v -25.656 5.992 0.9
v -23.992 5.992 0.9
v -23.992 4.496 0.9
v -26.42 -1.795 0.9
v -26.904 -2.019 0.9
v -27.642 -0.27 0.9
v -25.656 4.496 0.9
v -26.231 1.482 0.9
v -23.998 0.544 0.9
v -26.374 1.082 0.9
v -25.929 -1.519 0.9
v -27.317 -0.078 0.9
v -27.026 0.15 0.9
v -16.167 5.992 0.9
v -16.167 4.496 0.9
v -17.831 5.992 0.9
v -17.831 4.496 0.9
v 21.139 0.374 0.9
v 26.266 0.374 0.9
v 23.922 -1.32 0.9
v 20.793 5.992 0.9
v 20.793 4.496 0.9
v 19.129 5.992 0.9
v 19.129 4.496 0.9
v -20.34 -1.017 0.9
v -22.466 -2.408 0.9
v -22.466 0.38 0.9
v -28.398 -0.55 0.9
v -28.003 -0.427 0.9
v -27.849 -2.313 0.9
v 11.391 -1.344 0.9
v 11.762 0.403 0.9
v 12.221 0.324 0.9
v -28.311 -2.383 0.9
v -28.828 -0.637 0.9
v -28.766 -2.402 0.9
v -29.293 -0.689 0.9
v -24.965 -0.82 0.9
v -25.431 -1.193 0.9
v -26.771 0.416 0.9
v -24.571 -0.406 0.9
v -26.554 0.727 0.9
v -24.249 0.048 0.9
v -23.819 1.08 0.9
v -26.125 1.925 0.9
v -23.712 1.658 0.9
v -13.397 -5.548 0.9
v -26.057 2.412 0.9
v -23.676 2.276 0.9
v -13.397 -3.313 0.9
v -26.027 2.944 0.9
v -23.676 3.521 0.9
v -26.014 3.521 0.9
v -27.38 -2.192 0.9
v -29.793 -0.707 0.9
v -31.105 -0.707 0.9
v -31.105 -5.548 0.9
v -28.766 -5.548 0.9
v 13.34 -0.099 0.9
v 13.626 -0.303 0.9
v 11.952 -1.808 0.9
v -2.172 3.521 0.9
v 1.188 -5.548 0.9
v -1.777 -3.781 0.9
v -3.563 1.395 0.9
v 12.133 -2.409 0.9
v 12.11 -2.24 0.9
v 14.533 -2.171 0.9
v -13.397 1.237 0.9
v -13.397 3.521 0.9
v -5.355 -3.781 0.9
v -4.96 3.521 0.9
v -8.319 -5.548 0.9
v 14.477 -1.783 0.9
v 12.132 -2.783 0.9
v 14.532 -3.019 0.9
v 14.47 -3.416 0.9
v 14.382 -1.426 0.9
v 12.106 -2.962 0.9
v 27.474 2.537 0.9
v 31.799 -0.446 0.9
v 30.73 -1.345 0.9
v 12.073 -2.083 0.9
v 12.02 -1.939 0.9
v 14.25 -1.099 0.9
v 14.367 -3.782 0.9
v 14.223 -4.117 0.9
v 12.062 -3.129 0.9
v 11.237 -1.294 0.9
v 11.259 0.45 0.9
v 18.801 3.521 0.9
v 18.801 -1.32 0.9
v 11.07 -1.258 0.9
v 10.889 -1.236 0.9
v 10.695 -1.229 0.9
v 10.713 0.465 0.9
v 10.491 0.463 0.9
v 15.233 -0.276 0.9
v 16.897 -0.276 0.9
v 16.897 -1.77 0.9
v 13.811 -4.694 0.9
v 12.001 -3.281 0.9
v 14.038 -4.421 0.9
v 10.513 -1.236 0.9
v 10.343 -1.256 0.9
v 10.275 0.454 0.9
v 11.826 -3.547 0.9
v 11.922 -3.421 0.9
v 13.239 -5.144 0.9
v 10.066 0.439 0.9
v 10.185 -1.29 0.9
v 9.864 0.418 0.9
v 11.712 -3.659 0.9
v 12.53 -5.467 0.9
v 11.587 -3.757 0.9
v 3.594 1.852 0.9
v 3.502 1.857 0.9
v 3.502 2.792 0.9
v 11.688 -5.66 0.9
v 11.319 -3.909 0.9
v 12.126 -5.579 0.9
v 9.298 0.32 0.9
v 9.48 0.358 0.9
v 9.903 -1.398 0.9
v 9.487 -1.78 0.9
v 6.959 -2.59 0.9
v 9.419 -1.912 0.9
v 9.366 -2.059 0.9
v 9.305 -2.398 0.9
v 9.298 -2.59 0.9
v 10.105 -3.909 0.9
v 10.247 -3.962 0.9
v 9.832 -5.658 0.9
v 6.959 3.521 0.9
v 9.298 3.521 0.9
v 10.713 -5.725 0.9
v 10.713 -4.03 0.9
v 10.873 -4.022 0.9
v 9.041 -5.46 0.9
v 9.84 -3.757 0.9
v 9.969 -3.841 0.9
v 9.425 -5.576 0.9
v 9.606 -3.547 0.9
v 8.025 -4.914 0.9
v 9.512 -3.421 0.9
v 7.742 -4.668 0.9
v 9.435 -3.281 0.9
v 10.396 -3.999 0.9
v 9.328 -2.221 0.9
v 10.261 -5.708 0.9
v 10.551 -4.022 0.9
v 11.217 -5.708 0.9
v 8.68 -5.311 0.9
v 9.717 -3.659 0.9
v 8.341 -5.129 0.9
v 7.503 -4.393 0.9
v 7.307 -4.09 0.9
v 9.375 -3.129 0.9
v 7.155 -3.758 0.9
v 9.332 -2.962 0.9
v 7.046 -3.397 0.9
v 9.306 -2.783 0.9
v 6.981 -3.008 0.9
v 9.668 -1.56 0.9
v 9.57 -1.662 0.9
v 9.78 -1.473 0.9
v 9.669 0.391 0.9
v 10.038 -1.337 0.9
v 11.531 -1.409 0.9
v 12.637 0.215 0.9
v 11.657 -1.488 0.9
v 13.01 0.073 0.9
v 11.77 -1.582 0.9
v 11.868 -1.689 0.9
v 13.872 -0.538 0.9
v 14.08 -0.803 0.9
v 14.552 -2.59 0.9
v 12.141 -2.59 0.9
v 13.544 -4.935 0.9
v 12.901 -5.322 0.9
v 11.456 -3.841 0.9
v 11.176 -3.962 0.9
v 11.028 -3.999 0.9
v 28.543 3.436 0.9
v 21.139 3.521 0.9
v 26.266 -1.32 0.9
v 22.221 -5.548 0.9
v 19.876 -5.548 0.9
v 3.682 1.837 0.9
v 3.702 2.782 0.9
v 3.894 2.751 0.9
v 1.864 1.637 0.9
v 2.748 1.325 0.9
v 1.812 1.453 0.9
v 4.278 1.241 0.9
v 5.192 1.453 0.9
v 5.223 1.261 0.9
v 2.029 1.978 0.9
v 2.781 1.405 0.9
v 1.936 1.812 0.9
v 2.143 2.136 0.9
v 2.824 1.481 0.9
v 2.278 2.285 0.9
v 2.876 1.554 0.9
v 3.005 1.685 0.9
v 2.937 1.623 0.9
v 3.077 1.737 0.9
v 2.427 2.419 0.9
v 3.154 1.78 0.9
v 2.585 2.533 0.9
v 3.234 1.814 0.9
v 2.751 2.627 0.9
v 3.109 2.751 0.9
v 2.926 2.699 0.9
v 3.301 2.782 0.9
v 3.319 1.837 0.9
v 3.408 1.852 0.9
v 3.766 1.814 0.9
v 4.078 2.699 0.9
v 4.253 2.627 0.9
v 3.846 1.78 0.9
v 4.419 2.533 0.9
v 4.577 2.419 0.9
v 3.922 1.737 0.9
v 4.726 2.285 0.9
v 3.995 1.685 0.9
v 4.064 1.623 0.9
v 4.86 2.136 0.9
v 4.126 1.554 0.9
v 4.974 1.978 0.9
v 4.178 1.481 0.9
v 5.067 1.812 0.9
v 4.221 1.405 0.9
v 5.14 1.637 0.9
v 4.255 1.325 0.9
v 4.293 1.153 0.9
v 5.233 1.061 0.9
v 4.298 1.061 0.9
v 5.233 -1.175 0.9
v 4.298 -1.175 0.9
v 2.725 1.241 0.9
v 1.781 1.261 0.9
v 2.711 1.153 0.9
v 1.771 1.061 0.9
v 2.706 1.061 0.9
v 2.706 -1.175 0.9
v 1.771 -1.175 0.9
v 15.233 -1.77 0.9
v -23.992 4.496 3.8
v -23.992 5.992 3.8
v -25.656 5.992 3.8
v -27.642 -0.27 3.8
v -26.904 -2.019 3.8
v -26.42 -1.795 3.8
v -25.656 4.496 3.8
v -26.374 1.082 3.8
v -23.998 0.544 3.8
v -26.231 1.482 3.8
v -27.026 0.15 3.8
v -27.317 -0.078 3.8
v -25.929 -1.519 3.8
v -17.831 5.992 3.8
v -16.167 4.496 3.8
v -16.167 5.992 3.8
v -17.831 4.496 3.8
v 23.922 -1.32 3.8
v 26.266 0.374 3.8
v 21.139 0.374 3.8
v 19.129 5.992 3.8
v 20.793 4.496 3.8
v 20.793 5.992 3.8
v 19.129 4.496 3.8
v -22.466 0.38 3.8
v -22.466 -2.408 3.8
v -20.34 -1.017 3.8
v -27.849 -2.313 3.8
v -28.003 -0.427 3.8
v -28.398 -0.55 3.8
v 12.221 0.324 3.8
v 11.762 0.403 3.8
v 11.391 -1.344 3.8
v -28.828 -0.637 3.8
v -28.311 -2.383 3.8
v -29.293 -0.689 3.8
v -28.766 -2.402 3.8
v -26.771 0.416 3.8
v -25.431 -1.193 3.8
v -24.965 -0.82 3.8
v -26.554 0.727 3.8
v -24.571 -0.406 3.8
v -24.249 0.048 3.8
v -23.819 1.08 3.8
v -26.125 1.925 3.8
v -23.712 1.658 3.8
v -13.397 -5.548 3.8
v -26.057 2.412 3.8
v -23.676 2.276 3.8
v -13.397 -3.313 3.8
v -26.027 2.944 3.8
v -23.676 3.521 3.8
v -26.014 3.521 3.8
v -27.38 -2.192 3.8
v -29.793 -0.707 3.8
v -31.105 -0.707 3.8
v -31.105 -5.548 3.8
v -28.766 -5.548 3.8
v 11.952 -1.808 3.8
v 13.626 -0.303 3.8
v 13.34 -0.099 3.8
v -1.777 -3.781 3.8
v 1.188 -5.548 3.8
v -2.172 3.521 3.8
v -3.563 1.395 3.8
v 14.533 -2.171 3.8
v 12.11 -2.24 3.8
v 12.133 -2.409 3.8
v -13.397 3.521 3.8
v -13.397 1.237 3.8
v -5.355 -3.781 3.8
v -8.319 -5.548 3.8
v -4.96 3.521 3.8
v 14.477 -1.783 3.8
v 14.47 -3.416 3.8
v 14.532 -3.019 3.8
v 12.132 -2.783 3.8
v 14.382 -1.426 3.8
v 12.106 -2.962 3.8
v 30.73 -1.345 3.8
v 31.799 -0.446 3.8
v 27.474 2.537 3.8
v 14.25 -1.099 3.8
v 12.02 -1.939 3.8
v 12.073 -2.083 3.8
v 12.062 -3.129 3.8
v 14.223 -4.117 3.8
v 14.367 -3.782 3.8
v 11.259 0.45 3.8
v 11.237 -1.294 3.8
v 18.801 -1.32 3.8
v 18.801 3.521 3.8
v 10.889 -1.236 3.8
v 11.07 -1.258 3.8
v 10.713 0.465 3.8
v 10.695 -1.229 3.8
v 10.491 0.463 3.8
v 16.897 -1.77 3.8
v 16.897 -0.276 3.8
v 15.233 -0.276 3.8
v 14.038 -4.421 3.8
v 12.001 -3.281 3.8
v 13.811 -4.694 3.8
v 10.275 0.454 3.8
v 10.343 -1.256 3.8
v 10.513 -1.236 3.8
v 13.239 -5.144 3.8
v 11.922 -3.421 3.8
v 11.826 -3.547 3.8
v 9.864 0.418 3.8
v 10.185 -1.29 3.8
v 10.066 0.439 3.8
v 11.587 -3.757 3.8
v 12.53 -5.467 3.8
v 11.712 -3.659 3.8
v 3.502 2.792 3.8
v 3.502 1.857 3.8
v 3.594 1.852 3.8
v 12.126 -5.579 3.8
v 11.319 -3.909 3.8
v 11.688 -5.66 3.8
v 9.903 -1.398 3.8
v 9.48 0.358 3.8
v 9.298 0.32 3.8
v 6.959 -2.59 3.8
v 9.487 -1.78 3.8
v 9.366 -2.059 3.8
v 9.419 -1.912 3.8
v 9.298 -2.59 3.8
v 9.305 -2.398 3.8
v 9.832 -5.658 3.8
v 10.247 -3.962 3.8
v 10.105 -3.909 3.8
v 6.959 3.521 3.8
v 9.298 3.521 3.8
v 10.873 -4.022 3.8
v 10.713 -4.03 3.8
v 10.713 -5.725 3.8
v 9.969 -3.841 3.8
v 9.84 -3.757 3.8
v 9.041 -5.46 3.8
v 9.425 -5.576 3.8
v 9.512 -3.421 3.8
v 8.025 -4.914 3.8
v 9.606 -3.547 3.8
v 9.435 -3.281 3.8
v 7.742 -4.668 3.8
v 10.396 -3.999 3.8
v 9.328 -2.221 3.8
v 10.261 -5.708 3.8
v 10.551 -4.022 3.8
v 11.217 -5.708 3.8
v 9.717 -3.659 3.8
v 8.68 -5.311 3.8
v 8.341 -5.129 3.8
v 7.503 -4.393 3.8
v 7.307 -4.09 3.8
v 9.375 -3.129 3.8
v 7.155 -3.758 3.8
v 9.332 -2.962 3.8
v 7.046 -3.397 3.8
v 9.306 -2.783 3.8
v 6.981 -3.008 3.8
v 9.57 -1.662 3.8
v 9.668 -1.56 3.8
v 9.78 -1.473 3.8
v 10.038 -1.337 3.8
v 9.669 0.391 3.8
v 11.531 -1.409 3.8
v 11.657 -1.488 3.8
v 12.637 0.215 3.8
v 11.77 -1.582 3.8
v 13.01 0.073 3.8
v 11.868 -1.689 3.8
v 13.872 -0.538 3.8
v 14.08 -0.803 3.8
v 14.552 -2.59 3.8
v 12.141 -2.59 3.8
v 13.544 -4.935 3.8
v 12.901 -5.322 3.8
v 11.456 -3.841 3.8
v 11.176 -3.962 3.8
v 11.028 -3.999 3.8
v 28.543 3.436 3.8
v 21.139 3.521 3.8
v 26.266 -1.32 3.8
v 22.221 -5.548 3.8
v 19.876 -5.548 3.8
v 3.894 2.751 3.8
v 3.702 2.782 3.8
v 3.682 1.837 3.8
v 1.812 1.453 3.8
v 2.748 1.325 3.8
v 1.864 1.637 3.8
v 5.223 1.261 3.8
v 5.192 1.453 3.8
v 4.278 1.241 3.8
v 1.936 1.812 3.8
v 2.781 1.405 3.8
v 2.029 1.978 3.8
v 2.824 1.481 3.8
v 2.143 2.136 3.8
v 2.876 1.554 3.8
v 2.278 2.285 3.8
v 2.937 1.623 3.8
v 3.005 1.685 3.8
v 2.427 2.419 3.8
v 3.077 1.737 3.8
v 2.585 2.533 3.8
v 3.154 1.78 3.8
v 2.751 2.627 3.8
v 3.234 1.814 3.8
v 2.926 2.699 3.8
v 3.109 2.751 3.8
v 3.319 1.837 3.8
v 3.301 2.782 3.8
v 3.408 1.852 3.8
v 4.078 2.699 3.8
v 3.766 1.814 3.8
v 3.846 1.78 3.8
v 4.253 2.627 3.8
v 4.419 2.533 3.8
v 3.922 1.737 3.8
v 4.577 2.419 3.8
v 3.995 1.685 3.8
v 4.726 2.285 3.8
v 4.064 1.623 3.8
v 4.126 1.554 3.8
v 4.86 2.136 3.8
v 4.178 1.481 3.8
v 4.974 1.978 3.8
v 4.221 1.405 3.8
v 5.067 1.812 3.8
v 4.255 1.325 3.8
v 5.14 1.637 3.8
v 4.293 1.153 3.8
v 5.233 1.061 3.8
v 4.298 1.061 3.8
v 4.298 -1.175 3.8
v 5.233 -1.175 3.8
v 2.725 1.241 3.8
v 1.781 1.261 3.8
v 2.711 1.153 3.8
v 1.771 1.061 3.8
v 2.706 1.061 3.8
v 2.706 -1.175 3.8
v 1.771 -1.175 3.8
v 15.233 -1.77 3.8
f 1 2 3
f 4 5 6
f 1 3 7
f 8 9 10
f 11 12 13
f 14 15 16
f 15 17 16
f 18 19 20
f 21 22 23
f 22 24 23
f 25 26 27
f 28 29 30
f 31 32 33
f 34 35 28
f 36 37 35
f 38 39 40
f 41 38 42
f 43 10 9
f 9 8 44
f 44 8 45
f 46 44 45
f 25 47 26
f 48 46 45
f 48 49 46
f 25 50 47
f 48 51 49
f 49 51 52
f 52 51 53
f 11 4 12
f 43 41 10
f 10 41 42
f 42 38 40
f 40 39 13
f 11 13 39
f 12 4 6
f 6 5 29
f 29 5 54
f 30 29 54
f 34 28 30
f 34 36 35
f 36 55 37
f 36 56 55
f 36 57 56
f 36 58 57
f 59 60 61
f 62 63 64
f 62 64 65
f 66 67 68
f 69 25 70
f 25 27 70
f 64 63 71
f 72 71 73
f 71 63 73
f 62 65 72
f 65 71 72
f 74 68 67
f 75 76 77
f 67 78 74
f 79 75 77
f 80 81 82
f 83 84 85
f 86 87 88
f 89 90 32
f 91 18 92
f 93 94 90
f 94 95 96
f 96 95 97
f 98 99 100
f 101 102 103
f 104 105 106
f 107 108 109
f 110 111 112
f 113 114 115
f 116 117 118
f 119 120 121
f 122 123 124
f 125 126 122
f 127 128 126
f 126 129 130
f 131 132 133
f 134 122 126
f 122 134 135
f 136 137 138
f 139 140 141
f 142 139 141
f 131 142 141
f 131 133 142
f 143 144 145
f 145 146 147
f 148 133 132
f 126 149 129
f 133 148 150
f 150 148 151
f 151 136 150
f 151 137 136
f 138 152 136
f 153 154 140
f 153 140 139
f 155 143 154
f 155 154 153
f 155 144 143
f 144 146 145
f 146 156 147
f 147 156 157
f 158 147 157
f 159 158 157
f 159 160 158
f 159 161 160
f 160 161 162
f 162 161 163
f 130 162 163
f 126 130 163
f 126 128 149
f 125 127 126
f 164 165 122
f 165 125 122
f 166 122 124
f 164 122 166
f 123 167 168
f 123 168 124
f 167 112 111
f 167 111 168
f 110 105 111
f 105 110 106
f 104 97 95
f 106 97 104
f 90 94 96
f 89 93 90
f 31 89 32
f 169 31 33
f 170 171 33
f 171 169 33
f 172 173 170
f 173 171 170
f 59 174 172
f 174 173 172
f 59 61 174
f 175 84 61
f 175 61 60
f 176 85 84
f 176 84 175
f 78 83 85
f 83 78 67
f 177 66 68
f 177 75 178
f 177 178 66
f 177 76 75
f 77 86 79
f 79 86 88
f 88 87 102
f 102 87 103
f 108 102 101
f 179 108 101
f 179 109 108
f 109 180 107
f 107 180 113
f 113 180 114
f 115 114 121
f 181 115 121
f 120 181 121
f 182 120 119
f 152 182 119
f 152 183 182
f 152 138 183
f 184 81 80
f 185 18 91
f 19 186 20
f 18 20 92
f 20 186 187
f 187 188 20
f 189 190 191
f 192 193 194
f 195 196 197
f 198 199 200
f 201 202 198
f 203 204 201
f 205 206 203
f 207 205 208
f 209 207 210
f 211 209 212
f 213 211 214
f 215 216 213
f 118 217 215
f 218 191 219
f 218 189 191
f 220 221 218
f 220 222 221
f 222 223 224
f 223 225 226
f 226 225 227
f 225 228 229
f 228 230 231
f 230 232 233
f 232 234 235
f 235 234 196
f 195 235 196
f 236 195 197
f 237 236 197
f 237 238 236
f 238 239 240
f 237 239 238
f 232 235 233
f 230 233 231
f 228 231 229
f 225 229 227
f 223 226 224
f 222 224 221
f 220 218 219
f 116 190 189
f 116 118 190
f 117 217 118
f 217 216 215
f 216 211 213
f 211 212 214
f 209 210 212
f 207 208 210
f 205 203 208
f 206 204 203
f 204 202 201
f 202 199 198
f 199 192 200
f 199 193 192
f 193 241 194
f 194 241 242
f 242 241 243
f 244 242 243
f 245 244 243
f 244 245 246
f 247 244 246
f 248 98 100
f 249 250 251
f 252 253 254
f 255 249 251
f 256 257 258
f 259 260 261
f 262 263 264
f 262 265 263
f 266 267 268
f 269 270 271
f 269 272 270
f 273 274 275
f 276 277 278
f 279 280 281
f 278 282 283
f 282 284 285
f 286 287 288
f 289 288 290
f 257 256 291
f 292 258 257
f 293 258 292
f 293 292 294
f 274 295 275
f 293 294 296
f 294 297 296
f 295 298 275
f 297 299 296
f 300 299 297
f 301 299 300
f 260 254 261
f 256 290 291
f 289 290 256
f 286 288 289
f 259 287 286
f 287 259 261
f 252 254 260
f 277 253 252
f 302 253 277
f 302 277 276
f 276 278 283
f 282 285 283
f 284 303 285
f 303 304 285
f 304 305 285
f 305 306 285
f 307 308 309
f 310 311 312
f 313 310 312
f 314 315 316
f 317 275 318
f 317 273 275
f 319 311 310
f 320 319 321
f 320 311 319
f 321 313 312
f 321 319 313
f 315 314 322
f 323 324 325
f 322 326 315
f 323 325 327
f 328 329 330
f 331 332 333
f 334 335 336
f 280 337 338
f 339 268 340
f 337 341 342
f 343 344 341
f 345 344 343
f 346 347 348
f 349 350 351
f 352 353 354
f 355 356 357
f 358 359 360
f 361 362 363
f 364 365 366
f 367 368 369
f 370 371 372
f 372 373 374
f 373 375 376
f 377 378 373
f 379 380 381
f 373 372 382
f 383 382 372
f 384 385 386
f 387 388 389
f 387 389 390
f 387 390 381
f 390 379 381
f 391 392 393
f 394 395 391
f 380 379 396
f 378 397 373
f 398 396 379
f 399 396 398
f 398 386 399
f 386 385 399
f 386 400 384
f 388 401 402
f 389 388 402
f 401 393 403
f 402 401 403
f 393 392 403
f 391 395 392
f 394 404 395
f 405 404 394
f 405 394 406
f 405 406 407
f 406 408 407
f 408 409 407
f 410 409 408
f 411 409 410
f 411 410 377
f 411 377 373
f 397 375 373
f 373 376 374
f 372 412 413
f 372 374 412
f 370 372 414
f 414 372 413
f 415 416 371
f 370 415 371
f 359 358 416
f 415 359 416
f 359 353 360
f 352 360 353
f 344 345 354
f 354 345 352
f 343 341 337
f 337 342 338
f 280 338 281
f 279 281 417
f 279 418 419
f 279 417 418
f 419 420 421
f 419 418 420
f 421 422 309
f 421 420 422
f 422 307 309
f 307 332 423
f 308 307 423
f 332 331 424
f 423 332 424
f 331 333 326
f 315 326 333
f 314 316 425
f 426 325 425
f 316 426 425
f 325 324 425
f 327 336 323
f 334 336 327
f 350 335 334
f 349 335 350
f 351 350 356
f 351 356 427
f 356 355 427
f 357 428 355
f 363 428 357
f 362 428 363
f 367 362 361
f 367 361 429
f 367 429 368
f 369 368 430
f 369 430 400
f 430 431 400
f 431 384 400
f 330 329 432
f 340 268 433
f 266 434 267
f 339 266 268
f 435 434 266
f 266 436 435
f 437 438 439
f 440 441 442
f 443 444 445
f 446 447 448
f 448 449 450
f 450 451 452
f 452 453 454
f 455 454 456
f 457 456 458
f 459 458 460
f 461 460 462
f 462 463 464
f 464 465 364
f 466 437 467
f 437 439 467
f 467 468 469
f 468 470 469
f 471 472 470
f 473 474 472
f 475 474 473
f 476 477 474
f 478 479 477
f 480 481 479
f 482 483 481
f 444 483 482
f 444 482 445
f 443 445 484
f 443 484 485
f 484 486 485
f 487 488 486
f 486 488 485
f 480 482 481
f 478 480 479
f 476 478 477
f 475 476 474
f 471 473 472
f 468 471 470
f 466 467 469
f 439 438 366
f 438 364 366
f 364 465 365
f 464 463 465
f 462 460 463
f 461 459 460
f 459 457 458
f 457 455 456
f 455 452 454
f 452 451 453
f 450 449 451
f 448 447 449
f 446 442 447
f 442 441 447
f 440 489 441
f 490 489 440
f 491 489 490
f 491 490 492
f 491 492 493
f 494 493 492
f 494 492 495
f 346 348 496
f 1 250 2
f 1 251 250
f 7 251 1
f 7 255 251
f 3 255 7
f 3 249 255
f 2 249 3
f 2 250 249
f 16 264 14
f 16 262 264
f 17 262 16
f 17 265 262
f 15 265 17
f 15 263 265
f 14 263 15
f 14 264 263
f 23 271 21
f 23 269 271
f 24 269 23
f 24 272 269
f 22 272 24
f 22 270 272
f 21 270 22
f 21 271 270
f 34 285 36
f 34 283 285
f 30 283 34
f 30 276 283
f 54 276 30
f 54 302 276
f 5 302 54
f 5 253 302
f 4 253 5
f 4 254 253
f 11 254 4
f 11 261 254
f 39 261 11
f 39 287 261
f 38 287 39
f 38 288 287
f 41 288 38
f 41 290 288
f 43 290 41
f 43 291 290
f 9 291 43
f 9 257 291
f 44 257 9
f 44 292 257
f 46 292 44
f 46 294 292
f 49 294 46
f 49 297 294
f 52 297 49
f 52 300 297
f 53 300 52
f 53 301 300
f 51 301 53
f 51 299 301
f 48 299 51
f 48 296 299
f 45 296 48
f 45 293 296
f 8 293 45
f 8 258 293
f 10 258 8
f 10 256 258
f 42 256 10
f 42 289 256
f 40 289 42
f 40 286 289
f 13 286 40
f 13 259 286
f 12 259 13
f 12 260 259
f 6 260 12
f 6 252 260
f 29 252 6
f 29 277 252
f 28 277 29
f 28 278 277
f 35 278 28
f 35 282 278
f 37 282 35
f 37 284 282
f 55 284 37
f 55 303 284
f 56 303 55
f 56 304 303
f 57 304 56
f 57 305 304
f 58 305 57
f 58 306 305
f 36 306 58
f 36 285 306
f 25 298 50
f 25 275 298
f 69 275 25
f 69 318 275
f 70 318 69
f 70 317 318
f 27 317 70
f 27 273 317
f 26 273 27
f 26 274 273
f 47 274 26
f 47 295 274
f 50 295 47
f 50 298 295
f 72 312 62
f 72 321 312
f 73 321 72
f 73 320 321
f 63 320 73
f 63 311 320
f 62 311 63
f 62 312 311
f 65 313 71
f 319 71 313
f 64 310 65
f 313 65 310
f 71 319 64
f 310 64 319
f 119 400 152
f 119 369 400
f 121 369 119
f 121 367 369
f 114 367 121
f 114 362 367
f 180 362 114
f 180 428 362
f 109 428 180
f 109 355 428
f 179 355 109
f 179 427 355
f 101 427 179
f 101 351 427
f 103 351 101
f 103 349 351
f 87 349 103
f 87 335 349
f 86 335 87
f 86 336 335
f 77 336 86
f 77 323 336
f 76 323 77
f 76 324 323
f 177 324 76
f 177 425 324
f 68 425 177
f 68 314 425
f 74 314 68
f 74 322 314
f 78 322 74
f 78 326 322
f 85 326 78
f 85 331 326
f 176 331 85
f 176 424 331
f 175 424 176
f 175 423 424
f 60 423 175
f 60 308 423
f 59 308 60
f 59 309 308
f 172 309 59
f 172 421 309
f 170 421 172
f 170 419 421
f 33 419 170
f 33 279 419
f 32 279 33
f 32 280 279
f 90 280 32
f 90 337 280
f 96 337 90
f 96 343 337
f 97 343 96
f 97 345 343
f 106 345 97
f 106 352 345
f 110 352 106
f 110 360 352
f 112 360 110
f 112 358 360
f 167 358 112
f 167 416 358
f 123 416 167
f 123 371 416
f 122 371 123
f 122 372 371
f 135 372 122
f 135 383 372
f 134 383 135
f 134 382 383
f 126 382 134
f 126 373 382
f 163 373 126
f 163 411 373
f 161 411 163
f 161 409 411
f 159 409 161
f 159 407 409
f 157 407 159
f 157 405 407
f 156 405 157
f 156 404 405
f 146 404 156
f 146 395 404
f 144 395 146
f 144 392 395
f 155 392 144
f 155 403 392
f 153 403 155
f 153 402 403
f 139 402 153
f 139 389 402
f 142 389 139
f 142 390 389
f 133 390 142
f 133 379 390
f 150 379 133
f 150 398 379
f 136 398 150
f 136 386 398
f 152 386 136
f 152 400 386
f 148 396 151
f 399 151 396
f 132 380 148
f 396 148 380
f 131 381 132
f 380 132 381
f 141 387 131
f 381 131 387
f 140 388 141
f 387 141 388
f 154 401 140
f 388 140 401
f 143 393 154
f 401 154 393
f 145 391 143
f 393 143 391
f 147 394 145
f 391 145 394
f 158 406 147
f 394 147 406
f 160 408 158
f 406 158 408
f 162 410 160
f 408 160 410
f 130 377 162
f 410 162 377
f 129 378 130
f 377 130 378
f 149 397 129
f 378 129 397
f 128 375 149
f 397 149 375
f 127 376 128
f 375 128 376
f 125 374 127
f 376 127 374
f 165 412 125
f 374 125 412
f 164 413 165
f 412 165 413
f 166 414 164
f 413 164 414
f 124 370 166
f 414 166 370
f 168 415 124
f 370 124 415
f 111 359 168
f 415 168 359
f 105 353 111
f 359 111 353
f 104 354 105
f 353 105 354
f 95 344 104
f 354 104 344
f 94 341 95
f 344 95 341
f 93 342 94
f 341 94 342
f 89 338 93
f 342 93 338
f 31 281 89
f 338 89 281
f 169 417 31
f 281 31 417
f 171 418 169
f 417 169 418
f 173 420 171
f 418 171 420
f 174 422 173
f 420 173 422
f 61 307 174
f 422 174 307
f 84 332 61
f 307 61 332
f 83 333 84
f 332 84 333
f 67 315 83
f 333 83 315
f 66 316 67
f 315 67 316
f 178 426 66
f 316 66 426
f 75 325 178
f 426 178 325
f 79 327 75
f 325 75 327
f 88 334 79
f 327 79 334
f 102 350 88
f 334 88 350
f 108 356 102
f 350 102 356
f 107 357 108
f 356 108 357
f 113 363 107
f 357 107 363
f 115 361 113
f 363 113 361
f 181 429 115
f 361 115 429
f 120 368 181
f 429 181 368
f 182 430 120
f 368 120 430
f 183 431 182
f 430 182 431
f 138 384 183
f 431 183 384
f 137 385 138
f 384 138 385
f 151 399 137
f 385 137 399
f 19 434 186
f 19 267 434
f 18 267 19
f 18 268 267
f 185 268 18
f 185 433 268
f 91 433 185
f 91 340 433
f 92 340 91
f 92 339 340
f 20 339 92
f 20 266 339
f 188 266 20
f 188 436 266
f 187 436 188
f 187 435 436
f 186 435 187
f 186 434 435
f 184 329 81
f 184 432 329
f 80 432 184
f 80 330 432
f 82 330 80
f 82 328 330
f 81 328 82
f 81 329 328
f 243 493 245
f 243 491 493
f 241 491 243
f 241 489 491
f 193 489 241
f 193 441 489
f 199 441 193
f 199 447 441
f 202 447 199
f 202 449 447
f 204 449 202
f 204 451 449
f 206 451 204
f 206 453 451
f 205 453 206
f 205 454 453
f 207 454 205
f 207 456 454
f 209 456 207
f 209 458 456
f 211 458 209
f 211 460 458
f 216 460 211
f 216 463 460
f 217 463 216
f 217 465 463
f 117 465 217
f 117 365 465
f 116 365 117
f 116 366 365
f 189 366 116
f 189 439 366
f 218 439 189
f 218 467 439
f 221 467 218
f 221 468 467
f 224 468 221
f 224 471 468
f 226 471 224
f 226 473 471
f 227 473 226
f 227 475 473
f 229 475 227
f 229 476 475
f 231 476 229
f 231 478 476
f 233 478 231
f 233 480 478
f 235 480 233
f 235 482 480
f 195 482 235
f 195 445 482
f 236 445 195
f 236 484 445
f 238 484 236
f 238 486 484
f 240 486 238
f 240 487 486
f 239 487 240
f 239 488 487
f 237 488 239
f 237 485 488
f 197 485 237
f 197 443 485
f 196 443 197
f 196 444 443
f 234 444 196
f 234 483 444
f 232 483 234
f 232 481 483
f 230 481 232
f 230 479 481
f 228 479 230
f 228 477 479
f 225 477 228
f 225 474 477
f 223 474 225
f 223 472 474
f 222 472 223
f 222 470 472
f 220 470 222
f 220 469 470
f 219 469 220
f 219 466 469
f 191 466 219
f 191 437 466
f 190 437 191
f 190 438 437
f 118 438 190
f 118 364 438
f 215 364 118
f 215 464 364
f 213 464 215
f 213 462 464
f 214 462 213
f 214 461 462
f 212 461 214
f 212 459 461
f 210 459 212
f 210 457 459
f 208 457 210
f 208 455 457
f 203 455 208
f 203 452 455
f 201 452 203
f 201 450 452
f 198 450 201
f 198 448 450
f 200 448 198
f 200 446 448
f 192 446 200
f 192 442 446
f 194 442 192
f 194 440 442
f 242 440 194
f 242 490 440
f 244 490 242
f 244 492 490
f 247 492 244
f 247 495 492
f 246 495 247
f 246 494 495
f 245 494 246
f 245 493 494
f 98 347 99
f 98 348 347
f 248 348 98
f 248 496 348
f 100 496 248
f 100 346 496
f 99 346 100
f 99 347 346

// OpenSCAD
$fn = 48;
  // syllabics (overlaid on icon, tallest)
  translate([0, 0.000, 0.900]) linear_extrude(height=2.900) text("ᓰᐹ ᐃᐢᑿᔮᐠ", size=8.958, halign="center", valign="center", font="Euphemia UCAS:style=Bold");
